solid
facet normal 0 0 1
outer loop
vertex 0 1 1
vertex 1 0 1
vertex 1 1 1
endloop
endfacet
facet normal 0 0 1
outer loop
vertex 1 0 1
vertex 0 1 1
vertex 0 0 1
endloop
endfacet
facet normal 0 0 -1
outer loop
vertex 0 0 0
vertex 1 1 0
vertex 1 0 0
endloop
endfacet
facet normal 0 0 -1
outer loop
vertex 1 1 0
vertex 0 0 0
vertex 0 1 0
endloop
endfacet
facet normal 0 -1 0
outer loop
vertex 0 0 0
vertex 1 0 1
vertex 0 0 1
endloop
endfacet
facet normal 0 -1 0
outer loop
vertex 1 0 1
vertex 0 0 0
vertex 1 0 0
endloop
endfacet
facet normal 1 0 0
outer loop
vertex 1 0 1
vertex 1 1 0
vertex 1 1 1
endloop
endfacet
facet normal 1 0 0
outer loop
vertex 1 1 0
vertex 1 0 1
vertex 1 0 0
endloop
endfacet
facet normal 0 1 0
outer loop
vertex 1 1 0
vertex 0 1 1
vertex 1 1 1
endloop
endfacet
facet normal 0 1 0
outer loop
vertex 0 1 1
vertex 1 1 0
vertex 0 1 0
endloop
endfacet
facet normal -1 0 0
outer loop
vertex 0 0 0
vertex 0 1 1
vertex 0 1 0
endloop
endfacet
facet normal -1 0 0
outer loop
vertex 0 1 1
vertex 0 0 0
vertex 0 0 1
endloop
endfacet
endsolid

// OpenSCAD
echo("negative remainder", -180.034799 % 360);
echo("positive remainder", 180.034799 % 360);
cube(1);
